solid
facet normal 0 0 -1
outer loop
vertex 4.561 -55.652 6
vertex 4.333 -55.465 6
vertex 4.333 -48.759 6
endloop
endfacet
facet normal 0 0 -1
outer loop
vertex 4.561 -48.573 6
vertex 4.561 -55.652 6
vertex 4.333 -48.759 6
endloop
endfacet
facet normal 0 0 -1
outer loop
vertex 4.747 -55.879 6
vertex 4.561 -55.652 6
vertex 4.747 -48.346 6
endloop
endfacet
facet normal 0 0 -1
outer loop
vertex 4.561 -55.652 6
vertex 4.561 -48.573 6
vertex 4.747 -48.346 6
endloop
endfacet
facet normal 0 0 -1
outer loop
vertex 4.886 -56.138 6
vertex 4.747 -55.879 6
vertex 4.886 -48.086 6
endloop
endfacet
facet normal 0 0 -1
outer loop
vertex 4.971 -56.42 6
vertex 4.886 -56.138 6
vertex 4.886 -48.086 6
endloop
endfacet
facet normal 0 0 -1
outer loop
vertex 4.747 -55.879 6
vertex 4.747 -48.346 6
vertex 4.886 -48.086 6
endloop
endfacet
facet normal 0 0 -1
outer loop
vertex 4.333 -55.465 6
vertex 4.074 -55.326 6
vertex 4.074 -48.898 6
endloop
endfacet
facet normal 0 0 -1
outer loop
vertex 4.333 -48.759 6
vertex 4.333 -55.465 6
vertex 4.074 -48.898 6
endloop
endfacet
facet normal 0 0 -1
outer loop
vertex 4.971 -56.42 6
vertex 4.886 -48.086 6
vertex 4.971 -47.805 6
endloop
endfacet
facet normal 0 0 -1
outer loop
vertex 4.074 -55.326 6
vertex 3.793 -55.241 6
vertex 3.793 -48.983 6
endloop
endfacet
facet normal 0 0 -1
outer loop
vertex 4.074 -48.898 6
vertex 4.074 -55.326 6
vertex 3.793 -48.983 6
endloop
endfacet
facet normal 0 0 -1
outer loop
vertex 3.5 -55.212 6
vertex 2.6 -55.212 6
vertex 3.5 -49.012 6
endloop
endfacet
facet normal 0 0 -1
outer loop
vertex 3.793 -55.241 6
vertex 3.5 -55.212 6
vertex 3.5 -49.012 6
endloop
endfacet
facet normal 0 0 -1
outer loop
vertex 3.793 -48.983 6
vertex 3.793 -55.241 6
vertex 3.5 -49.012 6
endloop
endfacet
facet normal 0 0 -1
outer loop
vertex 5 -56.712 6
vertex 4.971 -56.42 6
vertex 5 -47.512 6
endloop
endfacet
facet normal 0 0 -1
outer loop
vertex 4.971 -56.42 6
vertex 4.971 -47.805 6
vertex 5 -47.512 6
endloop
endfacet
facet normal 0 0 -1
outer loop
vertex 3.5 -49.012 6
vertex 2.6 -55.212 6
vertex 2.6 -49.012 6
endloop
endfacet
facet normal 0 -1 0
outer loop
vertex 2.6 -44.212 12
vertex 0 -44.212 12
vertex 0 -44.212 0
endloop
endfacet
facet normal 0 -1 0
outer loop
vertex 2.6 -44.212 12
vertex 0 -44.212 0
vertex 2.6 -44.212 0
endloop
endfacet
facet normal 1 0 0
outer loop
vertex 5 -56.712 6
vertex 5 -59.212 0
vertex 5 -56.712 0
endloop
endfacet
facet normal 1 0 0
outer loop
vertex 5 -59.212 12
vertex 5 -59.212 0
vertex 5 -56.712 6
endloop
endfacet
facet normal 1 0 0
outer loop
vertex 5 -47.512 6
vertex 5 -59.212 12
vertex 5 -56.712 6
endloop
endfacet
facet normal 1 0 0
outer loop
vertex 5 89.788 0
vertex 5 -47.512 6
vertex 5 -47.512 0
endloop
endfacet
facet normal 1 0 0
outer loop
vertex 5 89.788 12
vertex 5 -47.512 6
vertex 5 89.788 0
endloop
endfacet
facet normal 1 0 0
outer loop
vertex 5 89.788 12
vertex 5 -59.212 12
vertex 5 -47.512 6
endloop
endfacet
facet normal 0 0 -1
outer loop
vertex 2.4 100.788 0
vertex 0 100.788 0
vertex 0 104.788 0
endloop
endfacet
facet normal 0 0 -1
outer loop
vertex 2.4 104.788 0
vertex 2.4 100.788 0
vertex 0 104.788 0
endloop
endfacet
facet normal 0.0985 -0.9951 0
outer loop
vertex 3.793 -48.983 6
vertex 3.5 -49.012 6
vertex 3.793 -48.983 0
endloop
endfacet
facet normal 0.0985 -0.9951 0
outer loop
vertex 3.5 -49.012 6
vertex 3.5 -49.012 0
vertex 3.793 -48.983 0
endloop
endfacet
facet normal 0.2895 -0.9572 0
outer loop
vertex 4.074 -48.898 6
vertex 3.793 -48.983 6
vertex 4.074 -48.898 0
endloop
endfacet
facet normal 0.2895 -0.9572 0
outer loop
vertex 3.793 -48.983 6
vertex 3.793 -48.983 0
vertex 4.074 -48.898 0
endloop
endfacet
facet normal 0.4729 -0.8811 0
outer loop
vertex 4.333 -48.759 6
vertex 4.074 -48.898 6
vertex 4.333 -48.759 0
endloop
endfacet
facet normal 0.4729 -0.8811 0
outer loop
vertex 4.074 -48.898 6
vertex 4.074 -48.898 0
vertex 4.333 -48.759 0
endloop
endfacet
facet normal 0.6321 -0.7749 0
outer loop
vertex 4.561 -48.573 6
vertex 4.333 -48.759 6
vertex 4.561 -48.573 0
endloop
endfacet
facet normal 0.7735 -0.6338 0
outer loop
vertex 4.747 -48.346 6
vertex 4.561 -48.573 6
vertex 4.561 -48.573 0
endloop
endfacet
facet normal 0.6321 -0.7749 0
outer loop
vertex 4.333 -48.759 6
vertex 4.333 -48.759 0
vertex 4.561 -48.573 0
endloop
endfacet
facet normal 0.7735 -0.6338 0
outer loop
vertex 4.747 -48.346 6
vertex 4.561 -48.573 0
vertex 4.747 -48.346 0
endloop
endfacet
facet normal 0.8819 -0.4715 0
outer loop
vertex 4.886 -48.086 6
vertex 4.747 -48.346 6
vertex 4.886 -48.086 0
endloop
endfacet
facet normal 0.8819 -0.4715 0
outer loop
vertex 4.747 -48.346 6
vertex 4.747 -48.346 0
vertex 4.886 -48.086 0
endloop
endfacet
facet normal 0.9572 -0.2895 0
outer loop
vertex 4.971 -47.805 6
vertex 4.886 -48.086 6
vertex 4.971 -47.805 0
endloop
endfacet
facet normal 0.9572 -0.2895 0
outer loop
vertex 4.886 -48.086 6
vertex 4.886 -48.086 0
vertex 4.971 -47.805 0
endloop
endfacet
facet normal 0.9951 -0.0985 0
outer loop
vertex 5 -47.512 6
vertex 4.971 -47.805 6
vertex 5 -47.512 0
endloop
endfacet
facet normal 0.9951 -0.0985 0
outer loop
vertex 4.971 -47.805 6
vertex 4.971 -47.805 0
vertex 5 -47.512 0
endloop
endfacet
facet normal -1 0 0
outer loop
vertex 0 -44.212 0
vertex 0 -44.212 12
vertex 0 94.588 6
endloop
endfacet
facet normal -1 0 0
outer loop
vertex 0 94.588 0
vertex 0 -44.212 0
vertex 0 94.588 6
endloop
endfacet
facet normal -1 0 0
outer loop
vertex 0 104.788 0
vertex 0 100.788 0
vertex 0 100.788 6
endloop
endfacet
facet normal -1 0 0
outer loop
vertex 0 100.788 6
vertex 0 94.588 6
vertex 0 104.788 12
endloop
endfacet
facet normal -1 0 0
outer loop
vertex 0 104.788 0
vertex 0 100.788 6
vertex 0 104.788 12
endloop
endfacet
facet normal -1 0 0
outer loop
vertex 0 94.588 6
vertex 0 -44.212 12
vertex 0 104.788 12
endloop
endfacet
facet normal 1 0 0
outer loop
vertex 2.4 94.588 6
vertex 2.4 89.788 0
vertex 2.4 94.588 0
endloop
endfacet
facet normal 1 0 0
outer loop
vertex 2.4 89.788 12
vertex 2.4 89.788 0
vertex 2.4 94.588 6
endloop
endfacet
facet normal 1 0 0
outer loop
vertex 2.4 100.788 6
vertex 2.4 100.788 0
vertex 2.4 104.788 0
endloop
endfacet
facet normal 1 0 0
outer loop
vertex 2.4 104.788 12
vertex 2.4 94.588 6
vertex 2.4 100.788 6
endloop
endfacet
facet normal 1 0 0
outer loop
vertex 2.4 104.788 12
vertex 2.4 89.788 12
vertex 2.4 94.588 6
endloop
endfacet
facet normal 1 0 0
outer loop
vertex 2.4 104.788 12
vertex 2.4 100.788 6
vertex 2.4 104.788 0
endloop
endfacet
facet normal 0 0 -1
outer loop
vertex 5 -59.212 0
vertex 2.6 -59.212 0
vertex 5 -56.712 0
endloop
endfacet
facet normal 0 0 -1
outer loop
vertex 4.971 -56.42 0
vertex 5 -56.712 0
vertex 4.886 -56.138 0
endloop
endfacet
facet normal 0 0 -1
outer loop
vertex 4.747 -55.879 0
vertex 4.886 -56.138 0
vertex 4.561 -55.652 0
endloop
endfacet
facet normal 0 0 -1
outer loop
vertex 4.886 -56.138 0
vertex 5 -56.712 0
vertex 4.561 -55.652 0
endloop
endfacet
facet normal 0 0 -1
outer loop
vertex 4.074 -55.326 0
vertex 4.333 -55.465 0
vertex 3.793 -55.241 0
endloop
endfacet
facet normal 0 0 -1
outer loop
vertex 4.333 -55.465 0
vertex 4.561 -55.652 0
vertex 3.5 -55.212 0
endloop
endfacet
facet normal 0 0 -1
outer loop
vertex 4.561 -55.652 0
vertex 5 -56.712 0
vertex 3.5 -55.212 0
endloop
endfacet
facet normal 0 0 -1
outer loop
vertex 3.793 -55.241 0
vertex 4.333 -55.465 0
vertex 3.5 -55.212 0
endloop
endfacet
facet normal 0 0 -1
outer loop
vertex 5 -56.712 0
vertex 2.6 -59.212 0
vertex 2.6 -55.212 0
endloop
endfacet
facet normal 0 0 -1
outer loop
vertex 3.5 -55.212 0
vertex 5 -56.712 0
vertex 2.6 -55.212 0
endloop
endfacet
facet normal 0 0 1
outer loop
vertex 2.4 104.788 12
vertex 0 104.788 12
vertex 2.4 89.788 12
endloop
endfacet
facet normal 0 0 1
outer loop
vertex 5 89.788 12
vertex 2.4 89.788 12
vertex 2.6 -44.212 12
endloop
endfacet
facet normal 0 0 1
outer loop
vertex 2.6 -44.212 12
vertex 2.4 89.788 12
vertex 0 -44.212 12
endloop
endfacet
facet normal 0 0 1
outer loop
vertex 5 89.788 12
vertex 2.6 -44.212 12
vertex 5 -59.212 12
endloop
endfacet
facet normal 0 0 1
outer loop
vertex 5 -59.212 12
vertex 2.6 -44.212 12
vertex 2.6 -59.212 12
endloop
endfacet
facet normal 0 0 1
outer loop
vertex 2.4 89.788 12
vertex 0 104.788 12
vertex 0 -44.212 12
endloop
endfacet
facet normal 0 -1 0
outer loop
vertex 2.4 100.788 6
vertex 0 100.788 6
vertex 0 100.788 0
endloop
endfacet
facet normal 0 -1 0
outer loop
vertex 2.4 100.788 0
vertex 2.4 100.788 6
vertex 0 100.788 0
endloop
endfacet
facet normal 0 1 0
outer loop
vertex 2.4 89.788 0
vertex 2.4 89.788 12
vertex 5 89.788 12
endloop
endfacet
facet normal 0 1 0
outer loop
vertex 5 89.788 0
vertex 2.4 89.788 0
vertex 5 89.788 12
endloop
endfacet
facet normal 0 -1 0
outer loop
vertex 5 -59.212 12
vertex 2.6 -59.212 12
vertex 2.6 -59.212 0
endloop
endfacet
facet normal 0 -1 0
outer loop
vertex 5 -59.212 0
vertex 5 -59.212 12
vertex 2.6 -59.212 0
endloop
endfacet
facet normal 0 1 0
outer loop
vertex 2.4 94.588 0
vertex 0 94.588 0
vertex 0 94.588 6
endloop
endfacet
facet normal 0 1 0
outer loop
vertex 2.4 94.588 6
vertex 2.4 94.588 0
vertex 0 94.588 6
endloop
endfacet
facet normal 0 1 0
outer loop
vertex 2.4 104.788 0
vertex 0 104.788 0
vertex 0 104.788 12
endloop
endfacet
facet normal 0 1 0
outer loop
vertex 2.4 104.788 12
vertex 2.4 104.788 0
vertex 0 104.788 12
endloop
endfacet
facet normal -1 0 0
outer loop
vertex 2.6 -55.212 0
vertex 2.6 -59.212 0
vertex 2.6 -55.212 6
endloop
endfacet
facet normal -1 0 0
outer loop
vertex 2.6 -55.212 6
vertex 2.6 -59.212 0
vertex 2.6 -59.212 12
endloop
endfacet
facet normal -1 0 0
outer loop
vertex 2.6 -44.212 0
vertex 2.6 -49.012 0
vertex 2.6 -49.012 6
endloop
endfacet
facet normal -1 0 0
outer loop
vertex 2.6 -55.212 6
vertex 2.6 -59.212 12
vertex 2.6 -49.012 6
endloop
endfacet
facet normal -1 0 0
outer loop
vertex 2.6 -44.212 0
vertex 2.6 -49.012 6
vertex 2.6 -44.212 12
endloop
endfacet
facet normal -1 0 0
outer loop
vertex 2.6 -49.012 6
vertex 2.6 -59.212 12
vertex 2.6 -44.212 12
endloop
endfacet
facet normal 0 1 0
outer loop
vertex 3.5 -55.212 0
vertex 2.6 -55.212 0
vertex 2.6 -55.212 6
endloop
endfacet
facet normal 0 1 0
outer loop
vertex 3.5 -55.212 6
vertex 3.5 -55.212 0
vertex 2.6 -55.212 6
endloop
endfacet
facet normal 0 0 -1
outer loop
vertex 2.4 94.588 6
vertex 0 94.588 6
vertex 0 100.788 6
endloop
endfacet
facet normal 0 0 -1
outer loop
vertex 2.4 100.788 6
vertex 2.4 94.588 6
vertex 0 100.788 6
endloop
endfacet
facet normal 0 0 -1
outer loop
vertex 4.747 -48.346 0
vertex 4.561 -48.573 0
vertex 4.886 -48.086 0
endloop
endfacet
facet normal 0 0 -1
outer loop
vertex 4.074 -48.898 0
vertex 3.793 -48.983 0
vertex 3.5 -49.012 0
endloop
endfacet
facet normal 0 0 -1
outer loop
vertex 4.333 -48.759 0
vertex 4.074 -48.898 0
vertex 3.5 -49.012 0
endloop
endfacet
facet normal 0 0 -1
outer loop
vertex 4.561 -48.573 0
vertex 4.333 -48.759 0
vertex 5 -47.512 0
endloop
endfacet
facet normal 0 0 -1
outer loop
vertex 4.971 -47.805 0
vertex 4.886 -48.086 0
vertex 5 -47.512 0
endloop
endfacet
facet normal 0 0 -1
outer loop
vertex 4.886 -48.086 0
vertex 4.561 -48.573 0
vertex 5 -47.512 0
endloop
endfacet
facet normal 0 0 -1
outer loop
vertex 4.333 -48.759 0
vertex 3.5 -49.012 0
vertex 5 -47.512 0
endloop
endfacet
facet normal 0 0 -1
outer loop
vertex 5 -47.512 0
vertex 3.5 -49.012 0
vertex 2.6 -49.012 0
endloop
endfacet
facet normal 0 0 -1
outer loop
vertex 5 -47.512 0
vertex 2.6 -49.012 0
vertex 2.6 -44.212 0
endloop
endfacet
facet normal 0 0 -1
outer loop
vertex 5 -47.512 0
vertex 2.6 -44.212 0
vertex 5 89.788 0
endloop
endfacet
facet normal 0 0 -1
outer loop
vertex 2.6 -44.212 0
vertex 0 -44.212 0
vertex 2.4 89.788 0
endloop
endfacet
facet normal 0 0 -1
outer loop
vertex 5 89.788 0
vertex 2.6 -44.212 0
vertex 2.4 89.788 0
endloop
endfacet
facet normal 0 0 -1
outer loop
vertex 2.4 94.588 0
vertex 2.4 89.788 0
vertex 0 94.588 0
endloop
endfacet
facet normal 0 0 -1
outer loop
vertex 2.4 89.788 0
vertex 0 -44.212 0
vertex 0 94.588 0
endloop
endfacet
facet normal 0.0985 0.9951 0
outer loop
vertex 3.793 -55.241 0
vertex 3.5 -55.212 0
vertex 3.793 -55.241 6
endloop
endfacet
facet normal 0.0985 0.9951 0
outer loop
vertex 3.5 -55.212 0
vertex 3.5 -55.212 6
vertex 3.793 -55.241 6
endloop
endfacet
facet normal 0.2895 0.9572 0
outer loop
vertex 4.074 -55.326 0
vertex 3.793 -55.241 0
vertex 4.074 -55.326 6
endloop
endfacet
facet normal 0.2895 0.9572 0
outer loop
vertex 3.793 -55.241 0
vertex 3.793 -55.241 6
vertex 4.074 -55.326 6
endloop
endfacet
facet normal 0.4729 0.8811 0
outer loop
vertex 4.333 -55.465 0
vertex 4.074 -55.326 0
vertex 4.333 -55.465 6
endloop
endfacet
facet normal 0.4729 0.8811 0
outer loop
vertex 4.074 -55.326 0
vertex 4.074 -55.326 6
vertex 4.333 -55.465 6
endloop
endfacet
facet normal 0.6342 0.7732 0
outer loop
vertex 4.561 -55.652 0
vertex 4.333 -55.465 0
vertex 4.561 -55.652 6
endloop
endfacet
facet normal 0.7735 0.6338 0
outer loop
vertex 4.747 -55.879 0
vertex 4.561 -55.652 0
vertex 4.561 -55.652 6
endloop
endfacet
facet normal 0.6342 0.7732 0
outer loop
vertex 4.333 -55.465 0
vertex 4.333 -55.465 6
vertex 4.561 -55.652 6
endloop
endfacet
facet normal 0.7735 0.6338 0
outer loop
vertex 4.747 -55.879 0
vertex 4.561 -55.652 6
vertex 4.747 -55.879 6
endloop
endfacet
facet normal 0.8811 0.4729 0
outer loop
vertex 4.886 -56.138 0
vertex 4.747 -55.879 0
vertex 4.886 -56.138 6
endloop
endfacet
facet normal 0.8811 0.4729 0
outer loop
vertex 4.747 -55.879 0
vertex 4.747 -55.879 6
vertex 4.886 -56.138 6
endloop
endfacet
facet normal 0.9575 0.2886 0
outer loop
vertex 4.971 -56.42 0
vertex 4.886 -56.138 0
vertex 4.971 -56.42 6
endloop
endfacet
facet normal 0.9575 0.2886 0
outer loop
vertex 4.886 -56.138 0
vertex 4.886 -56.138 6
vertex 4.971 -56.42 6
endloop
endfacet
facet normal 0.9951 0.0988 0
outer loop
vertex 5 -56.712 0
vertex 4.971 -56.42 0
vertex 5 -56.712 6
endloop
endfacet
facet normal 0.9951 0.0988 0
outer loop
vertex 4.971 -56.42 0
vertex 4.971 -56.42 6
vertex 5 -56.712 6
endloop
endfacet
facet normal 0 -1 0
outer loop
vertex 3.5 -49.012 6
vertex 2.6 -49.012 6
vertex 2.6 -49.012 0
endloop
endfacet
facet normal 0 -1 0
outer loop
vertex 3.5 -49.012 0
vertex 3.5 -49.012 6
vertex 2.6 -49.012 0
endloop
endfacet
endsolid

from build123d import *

# Parameters (mm, degrees)
F1_DEPTH = 5
F2_R     = 1.5
F3_W     = 2.6
F3_H     = 15
F4_DEPTH = 12.001


with BuildPart() as f1:
    # F0 (on Right) → F1 (new body)
    with BuildSketch(Plane.YZ):
        Polygon((-59.212235, 12), (-59.212235, 0), (-55.212235, 0), (-55.212235, 6), (-49.012235, 6), (-49.012235, 0), (94.587765, 0), (94.587765, 6), (100.787765, 6), (100.787765, 0), (104.787765, 0), (104.787765, 12), align=None)
    extrude(amount=F1_DEPTH)

    # F2
    f2_edges = [f1.edges().sort_by_distance(p)[0] for p in [
        (5, -55.212235, 3),
        (5, -49.012235, 3),
    ]]
    fillet(f2_edges, radius=F2_R)

    # F3 (on face) → F4 (cut, through all)
    with BuildSketch(Plane.XY.offset(12)):
        with Locations((3.7, 97.287765)):
            Rectangle(F3_W, F3_H)
        with Locations((1.3, -51.712235)):
            Rectangle(F3_W, F3_H)
    extrude(amount=-F4_DEPTH, mode=Mode.SUBTRACT)


solid = f1.part
